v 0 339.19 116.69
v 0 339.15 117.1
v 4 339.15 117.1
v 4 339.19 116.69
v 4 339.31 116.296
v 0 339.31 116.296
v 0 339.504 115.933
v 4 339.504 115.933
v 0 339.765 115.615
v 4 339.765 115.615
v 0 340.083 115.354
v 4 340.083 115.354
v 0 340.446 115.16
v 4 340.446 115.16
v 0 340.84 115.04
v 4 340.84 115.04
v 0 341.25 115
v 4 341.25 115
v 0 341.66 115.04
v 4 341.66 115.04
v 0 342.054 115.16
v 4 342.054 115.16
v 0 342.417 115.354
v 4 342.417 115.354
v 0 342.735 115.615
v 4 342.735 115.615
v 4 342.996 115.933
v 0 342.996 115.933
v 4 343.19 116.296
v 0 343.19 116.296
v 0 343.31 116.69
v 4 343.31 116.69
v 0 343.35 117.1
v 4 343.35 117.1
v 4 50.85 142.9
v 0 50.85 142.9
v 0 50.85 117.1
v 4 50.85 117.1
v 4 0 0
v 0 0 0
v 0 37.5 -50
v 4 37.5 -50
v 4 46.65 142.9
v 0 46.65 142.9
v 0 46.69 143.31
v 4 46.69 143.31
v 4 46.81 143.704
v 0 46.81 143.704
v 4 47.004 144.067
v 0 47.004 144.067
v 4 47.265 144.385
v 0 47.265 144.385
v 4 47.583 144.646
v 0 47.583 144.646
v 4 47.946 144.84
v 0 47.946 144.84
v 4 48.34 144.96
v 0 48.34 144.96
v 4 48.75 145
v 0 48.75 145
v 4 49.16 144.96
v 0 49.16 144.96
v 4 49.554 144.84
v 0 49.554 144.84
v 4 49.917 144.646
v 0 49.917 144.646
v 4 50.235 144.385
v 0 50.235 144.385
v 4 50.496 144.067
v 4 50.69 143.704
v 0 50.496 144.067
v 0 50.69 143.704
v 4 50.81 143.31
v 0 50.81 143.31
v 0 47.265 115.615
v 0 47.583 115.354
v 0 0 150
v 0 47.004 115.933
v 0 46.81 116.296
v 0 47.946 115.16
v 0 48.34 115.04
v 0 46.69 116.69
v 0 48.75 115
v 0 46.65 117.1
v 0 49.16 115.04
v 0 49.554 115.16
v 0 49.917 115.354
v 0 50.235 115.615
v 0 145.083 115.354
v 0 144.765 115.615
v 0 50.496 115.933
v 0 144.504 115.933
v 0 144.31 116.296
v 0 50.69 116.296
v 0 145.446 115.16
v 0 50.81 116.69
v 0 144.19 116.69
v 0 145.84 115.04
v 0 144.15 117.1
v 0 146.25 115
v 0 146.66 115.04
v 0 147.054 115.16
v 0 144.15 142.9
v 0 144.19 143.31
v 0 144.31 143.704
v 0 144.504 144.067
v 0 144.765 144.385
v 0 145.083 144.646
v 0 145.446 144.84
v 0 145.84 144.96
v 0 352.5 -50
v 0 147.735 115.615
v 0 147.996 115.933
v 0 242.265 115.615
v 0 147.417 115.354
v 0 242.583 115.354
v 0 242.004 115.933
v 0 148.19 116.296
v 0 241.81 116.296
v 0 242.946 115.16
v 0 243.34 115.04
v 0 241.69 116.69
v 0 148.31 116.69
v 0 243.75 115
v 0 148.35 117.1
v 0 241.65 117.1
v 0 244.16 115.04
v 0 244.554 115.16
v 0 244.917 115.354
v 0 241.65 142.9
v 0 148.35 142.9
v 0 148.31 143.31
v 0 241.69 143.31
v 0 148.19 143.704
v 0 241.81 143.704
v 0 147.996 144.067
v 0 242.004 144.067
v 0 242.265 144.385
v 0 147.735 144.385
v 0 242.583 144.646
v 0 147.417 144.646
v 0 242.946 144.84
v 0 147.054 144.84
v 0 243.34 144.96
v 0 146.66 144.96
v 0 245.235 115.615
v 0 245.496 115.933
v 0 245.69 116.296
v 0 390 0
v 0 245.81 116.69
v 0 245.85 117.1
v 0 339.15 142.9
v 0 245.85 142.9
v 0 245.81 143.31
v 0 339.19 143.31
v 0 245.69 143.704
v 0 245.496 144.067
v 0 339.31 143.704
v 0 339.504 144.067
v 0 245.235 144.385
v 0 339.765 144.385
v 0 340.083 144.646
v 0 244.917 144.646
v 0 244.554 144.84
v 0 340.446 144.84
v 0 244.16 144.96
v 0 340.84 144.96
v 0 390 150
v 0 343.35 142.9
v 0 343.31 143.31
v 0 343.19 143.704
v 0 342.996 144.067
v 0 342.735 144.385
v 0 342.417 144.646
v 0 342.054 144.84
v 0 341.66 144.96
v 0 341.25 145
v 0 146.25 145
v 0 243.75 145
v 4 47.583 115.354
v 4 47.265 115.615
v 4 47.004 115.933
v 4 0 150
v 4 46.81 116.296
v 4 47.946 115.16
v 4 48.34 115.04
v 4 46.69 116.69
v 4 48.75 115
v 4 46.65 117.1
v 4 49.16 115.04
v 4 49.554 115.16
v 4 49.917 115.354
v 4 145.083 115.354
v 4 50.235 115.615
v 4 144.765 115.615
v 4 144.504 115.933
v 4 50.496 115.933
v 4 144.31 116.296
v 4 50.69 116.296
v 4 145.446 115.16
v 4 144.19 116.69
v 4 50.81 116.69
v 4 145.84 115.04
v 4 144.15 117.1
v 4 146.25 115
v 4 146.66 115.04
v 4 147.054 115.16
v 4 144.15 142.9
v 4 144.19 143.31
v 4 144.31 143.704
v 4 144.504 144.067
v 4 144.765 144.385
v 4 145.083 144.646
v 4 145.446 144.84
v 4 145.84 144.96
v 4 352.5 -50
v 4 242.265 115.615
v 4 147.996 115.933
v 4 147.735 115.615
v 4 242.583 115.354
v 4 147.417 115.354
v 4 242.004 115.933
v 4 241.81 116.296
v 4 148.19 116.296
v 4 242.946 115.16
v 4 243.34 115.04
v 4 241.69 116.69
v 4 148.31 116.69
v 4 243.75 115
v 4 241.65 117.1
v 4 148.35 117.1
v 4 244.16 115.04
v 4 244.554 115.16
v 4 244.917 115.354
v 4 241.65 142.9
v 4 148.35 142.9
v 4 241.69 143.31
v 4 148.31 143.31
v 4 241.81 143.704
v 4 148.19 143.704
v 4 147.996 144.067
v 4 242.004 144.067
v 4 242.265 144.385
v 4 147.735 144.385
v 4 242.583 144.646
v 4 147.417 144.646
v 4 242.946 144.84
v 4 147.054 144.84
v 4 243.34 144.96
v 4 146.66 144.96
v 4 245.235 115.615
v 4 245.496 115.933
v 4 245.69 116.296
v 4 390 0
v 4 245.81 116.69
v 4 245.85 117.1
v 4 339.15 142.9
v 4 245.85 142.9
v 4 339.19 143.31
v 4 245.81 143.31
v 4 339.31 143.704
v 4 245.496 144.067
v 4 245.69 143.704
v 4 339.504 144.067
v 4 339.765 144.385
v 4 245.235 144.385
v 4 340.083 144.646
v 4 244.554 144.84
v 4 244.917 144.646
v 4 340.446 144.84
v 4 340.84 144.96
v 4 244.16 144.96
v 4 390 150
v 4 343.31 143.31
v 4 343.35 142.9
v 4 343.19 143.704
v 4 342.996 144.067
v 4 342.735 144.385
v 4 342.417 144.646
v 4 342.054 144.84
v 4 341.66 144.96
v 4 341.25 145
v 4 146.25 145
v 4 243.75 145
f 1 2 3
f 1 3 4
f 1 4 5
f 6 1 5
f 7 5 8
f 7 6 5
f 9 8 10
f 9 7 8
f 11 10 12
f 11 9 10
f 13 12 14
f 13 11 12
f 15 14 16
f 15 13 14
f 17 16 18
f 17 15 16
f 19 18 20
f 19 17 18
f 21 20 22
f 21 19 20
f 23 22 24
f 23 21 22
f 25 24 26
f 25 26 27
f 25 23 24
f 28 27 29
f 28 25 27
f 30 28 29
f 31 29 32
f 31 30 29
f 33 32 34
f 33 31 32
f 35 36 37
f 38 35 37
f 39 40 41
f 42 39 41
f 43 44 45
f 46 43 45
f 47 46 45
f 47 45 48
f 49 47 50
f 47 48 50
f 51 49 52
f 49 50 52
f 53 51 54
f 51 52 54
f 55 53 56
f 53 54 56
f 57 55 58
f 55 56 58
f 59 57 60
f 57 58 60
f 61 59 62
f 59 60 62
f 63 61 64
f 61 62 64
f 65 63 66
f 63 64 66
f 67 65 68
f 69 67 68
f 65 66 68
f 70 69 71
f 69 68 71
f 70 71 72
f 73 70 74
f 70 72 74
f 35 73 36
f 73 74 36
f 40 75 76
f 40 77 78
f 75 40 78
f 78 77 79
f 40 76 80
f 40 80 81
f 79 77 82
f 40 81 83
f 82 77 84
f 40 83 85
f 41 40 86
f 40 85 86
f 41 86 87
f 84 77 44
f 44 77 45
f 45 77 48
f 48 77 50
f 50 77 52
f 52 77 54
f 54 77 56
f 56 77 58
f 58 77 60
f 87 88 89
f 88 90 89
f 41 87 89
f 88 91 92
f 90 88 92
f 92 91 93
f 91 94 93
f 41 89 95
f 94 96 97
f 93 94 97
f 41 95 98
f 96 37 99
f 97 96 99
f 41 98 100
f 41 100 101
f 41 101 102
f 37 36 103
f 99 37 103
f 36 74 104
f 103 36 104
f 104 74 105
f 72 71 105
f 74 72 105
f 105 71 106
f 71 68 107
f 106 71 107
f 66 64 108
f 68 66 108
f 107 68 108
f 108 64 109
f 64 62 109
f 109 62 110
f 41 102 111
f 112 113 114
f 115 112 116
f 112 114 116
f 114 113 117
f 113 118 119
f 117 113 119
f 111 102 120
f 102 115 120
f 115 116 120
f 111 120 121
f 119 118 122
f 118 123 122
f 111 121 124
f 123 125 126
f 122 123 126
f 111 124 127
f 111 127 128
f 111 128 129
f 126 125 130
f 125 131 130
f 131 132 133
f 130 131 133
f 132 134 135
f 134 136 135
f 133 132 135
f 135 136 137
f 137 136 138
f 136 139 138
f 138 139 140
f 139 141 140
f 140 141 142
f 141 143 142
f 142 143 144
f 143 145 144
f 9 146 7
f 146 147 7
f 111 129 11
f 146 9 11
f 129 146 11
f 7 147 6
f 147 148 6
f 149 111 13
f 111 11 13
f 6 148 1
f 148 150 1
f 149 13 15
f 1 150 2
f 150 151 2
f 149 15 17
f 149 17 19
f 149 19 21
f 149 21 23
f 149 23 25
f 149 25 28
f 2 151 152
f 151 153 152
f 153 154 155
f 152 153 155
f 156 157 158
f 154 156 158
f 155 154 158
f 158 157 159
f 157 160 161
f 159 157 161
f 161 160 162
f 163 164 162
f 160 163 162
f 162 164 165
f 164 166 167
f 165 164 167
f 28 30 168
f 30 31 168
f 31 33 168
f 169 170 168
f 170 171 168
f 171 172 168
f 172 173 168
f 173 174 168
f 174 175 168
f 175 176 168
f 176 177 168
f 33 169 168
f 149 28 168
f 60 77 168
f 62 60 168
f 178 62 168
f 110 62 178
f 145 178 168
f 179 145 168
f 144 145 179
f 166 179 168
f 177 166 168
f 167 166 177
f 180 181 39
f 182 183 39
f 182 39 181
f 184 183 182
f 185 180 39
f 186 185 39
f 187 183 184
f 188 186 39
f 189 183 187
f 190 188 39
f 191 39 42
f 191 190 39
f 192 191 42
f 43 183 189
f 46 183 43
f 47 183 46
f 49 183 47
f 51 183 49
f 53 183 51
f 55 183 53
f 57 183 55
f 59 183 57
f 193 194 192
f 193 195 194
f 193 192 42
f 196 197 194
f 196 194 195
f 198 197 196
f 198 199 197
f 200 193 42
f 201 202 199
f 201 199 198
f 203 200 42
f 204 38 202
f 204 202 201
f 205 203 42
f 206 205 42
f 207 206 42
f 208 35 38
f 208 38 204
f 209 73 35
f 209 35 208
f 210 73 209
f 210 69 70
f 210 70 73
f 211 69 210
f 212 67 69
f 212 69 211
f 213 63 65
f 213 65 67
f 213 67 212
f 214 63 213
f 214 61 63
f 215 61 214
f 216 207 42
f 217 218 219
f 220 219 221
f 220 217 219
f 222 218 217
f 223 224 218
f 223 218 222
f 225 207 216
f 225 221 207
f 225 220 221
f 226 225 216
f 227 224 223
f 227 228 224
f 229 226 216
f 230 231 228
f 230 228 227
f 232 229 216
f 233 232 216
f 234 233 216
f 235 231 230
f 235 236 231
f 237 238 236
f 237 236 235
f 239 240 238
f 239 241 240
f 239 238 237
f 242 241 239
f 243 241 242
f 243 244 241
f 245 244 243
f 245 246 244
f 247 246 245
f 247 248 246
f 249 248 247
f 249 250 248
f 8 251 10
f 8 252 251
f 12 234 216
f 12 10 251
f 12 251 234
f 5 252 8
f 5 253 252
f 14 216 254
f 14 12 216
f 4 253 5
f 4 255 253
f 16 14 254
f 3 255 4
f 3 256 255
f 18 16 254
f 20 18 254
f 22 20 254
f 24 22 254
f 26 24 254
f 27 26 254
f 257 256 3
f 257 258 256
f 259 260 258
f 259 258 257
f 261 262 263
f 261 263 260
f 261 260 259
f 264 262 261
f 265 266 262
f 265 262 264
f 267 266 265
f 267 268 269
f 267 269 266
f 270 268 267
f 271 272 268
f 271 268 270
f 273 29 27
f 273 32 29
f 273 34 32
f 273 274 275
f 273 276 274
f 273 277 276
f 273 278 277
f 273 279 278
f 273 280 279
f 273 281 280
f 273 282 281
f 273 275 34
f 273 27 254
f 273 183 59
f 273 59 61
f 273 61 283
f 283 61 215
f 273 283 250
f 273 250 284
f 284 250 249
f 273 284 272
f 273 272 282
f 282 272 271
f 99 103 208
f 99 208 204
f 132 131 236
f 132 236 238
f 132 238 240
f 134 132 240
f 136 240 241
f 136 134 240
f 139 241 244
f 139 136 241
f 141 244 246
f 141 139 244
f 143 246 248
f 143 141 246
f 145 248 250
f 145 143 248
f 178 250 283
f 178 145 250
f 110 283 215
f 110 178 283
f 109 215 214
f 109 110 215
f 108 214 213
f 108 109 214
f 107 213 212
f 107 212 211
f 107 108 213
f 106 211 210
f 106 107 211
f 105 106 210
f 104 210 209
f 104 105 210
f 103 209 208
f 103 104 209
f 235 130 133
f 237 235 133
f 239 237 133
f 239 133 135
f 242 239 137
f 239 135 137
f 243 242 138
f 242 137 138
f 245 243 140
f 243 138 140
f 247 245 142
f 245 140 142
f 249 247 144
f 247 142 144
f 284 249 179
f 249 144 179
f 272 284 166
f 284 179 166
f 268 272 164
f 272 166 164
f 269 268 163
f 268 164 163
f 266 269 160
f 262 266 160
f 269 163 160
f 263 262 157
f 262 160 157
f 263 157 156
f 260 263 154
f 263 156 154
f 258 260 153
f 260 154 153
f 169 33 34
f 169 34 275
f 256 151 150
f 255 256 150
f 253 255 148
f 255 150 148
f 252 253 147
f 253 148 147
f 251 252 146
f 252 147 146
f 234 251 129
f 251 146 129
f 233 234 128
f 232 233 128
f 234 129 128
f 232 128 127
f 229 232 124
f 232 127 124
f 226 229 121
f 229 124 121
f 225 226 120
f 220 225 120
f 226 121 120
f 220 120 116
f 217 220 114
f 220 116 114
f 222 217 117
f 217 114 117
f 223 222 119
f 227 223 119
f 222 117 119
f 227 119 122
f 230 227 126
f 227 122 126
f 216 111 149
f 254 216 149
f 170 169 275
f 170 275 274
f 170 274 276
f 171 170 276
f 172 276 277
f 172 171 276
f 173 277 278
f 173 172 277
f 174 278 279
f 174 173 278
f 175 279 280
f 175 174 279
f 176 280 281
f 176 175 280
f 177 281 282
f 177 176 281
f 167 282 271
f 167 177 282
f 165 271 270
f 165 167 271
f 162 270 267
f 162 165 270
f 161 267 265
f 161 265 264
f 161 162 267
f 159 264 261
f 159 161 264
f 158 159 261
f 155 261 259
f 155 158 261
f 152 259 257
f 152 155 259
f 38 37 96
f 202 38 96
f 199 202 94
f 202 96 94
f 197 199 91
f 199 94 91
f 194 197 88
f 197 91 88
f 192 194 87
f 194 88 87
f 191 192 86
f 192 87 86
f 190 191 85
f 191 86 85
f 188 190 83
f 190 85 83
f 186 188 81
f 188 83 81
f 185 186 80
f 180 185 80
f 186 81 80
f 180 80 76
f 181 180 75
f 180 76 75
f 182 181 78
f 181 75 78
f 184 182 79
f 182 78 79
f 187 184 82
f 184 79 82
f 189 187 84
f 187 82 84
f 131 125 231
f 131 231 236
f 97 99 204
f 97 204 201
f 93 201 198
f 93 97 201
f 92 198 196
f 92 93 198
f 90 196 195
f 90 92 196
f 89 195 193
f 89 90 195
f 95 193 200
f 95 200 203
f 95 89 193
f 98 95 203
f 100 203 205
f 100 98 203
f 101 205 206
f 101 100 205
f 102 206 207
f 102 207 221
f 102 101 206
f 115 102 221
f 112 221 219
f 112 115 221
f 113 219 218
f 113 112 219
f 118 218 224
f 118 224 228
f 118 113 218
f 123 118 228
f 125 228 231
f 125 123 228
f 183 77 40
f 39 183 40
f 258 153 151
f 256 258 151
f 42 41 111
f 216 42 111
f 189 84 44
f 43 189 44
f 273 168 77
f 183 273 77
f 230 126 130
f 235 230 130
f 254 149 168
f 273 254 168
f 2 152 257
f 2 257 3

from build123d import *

# Parameters (mm, degrees)
BOSS_EXTRUDE1_DEPTH = 4


with BuildPart() as part:
    # Sketch1 → Boss-Extrude1 (new body)
    with BuildSketch(Plane.YZ):
        Polygon((37.5, -50), (352.5, -50), (390, 0), (390, 150), (0, 150), (0, 0), align=None)
        with BuildLine():
            ThreePointArc((339.15, 117.1), (341.25, 115), (343.35, 117.1))
            Line((343.35, 117.1), (343.35, 142.9))
            ThreePointArc((343.35, 142.9), (341.25, 145), (339.15, 142.9))
            Line((339.15, 142.9), (339.15, 117.1))
        make_face(mode=Mode.SUBTRACT)
        with BuildLine():
            ThreePointArc((144.15, 117.1), (146.25, 115), (148.35, 117.1))
            Line((148.35, 117.1), (148.35, 142.9))
            ThreePointArc((148.35, 142.9), (146.25, 145), (144.15, 142.9))
            Line((144.15, 142.9), (144.15, 117.1))
        make_face(mode=Mode.SUBTRACT)
        with BuildLine():
            Line((50.85, 142.9), (50.85, 117.1))
            ThreePointArc((50.85, 117.1), (48.75, 115), (46.65, 117.1))
            Line((46.65, 117.1), (46.65, 142.9))
            ThreePointArc((46.65, 142.9), (48.75, 145), (50.85, 142.9))
        make_face(mode=Mode.SUBTRACT)
        with BuildLine():
            Line((245.85, 142.9), (245.85, 117.1))
            ThreePointArc((245.85, 117.1), (243.75, 115), (241.65, 117.1))
            Line((241.65, 117.1), (241.65, 142.9))
            ThreePointArc((241.65, 142.9), (243.75, 145), (245.85, 142.9))
        make_face(mode=Mode.SUBTRACT)
    extrude(amount=BOSS_EXTRUDE1_DEPTH)


solid = part.part
